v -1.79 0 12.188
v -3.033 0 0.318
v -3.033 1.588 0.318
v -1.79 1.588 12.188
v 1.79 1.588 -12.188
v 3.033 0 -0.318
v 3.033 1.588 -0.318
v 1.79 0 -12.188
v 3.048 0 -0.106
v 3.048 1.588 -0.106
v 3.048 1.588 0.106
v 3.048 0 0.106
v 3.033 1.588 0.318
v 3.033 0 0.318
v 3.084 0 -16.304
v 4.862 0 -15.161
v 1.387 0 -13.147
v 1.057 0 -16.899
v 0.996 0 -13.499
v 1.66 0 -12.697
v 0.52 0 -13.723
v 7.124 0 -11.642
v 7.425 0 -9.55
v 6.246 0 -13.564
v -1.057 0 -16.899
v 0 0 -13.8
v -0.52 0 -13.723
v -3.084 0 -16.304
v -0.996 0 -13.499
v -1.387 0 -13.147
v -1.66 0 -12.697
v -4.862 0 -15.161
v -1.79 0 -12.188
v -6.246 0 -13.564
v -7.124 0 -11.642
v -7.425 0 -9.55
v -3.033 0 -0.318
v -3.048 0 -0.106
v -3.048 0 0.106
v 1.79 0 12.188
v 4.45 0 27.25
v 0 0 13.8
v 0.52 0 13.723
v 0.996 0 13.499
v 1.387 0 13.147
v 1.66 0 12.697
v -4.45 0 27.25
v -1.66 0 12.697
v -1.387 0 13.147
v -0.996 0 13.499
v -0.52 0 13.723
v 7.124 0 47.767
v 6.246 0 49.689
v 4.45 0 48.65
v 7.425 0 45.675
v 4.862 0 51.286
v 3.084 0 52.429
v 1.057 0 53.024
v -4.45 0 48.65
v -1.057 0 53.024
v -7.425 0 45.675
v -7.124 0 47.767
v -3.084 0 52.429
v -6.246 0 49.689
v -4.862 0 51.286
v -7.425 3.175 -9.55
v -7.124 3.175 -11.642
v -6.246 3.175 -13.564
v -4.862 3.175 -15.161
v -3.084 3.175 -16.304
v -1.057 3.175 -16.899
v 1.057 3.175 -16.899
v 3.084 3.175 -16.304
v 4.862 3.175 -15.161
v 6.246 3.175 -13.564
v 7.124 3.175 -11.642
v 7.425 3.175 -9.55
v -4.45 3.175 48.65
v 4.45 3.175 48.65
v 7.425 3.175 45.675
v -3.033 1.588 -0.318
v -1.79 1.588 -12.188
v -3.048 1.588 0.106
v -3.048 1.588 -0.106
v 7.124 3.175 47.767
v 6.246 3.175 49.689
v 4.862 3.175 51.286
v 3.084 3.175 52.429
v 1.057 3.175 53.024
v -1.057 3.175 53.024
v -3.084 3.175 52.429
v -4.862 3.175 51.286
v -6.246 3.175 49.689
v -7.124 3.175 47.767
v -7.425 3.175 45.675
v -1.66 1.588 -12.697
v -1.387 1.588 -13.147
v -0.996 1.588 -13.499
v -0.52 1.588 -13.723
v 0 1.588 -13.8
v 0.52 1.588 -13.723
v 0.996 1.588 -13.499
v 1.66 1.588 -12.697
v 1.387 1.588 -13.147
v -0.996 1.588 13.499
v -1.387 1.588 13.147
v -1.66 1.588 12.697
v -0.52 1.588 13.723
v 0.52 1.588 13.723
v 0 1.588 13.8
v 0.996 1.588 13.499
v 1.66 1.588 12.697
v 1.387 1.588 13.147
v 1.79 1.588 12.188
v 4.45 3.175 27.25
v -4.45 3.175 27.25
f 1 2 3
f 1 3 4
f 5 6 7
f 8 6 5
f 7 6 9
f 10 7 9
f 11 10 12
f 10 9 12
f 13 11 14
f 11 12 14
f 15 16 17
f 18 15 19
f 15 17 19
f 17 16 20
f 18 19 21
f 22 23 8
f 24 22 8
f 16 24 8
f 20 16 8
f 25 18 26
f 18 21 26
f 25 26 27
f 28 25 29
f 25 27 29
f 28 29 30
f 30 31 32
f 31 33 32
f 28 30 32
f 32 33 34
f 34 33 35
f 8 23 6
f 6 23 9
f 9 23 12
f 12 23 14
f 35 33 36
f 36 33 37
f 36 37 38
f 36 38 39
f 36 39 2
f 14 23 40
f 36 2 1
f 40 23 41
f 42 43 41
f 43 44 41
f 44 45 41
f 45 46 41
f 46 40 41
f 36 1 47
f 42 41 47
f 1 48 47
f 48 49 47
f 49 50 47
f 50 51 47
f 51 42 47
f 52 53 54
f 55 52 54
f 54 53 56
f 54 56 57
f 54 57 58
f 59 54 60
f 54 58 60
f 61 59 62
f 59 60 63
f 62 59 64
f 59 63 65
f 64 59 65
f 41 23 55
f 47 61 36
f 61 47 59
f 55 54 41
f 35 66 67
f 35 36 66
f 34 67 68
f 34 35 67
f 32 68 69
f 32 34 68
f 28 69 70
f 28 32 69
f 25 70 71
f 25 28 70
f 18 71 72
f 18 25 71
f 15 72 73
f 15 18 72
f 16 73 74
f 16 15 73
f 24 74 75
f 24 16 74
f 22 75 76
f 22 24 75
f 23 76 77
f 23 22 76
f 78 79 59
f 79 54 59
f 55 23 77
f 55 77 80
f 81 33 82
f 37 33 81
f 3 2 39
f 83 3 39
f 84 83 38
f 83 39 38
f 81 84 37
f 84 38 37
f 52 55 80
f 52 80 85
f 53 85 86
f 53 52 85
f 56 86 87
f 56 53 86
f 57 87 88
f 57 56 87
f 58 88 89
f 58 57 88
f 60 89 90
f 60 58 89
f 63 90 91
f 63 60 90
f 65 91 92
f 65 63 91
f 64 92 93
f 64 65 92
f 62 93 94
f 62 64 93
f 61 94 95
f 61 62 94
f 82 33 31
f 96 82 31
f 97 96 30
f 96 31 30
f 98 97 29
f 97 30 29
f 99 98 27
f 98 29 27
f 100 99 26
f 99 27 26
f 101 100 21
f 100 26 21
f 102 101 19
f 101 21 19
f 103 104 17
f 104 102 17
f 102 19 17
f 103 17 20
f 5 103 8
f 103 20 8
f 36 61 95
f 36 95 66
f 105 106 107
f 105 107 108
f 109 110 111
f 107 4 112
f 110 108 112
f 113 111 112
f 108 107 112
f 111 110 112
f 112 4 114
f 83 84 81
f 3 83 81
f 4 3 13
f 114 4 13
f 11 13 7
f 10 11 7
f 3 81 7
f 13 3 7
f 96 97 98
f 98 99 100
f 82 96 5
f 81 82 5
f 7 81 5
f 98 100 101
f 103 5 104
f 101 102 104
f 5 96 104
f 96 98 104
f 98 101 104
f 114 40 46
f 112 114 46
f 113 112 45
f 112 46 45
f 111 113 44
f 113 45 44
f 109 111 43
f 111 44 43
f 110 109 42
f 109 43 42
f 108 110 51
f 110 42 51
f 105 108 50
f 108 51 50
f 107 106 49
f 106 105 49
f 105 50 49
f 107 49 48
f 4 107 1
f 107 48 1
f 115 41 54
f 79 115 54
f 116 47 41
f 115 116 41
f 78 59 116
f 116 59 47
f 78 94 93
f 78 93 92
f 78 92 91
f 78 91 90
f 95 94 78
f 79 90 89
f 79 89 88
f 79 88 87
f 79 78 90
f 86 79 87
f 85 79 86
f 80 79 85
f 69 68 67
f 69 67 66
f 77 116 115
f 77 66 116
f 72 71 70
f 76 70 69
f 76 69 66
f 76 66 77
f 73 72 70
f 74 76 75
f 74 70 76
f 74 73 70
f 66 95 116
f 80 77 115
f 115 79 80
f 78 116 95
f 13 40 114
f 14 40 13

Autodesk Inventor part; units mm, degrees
ref_plane "YZ Plane" through (0, 0, 0) normal (1, 0, 0) x (0, 1, 0)
ref_plane "XZ Plane" through (0, 0, 0) normal (0, 1, 0) x (-1, 0, 0)
ref_plane "XY Plane" through (0, 0, 0) normal (0, 0, 1) x (1, 0, 0)
sketch "Sketch1" plane through (0, 0, 0) normal (0, 1, 0) x (-1, 0, 0)
  arc A0 (1.4918, 12.1563) -> (-1.4918, 12.1563) centre (0, 12) ccw
  arc A1 (-1.4918, -12.1563) -> (1.4918, -12.1563) centre (0, -12) ccw
  line L0 (0, -12) -> (0, 12) construction
  line L1 (-2.735, 0.2865) -> (-1.4918, 12.1563)
  line L2 (1.4918, -12.1563) -> (2.735, -0.2865)
  line L3 (-1.4918, -12.1563) -> (-2.735, -0.2865)
  line L4 (2.735, 0.2865) -> (1.4918, 12.1563)
  arc A2 (-2.735, 0.2865) -> (-2.735, -0.2865) centre (0, 0) ccw
  arc A3 (2.735, -0.2865) -> (2.735, 0.2865) centre (0, 0) ccw
  line L5 (2.75, 0) -> (-2.75, 0) construction
  line L6 (-3.0334, -0.3177) -> (-1.7902, -12.1875)
  arc A4 (-1.7902, -12.1875) -> (1.7902, -12.1875) centre (0, -12) ccw
  line L7 (1.7902, -12.1875) -> (3.0334, -0.3177)
  arc A5 (3.0334, -0.3177) -> (3.0334, 0.3177) centre (0, 0) ccw
  line L8 (3.0334, 0.3177) -> (1.7902, 12.1875)
  arc A6 (1.7902, 12.1875) -> (-1.7902, 12.1875) centre (0, 12) ccw
  line L9 (-1.7902, 12.1875) -> (-3.0334, 0.3177)
  arc A7 (-3.0334, 0.3177) -> (-3.0334, -0.3177) centre (0, 0) ccw
  line L10 (-4.25, 27.45) -> (4.25, 27.45)
  line L11 (4.25, 27.45) -> (4.25, 48.45)
  line L12 (4.25, 48.45) -> (-4.25, 48.45)
  line L13 (-4.25, 48.45) -> (-4.25, 27.45)
  line L14 (0, -16.975) -> (0, 53.0999) construction
  line L15 (-7.425, -9.55) -> (-7.425, 45.6749)
  line L16 (7.425, 45.6749) -> (7.425, -9.55)
  arc A8 (-7.425, -9.55) -> (7.425, -9.55) centre (0, -9.55) ccw
  arc A9 (7.425, 45.6749) -> (-7.425, 45.6749) centre (0, 45.6749) ccw
  line L17 (4.45, 48.65) -> (4.45, 27.25)
  line L18 (4.45, 27.25) -> (-4.45, 27.25)
  line L19 (-4.45, 27.25) -> (-4.45, 48.65)
  line L20 (-4.45, 48.65) -> (4.45, 48.65)
  point P0 (0, 0)
  point P1 (0, 27.45)
  point P2 (0, 44.45)
  point P3 (0, 18.0624)
  point P4 (0, -13.8)
  point P5 (0, -16.975)
  dimension "d5" = 3
  dimension "d6" = 3
  dimension "d7" = 24
  dimension "d8" = 5.5
  dimension "d9" = 0.3
  dimension "d10" = 8.5
  dimension "d11" = 21
  dimension "d12" = 4
  dimension "d13" = 44.45
  dimension "d14" = 3.175
  dimension "d15" = 3.175
  dimension "d16" = 0.2
extrude "Extrusion1" add sketch "Sketch1" along normal blind 1.5875 contours L15 A9 L16 A8
sketch "Sketch2" plane through (0, 1.5875, 0) normal (0, 1, 0) x (1, 0, 0)
  line L0 (7.425, -45.6749) -> (7.425, 9.55) projected
  arc A0 (7.425, 9.55) -> (-7.425, 9.55) centre (0, 9.55) ccw projected
  line L1 (-7.425, 9.55) -> (-7.425, -45.6749) projected
  arc A1 (-7.425, -45.6749) -> (7.425, -45.6749) centre (0, -45.6749) ccw projected
  line L2 (-4.45, -48.65) -> (-4.45, -27.25) projected
  line L3 (-4.45, -27.25) -> (4.45, -27.25) projected
  line L4 (4.45, -27.25) -> (4.45, -48.65) projected
  line L5 (4.45, -48.65) -> (-4.45, -48.65) projected
  arc A2 (3.0334, -0.3177) -> (3.0334, 0.3177) centre (0, 0) ccw projected
  line L6 (3.0334, -0.3177) -> (1.7902, -12.1875) projected
  arc A3 (-1.7902, -12.1875) -> (1.7902, -12.1875) centre (0, -12) ccw projected
  line L7 (-1.7902, -12.1875) -> (-3.0334, -0.3177) projected
  arc A4 (-3.0334, 0.3177) -> (-3.0334, -0.3177) centre (0, 0) ccw projected
  line L8 (-3.0334, 0.3177) -> (-1.7902, 12.1875) projected
  arc A5 (1.7902, 12.1875) -> (-1.7902, 12.1875) centre (0, 12) ccw projected
  line L9 (1.7902, 12.1875) -> (3.0334, 0.3177) projected
extrude "Extrusion2" add sketch "Sketch2" along normal blind 1.5875 contours A1 L1 A0 L0 | L6 A3 L7 A4 L8 A5 L9 A2
properties part number "arm"
